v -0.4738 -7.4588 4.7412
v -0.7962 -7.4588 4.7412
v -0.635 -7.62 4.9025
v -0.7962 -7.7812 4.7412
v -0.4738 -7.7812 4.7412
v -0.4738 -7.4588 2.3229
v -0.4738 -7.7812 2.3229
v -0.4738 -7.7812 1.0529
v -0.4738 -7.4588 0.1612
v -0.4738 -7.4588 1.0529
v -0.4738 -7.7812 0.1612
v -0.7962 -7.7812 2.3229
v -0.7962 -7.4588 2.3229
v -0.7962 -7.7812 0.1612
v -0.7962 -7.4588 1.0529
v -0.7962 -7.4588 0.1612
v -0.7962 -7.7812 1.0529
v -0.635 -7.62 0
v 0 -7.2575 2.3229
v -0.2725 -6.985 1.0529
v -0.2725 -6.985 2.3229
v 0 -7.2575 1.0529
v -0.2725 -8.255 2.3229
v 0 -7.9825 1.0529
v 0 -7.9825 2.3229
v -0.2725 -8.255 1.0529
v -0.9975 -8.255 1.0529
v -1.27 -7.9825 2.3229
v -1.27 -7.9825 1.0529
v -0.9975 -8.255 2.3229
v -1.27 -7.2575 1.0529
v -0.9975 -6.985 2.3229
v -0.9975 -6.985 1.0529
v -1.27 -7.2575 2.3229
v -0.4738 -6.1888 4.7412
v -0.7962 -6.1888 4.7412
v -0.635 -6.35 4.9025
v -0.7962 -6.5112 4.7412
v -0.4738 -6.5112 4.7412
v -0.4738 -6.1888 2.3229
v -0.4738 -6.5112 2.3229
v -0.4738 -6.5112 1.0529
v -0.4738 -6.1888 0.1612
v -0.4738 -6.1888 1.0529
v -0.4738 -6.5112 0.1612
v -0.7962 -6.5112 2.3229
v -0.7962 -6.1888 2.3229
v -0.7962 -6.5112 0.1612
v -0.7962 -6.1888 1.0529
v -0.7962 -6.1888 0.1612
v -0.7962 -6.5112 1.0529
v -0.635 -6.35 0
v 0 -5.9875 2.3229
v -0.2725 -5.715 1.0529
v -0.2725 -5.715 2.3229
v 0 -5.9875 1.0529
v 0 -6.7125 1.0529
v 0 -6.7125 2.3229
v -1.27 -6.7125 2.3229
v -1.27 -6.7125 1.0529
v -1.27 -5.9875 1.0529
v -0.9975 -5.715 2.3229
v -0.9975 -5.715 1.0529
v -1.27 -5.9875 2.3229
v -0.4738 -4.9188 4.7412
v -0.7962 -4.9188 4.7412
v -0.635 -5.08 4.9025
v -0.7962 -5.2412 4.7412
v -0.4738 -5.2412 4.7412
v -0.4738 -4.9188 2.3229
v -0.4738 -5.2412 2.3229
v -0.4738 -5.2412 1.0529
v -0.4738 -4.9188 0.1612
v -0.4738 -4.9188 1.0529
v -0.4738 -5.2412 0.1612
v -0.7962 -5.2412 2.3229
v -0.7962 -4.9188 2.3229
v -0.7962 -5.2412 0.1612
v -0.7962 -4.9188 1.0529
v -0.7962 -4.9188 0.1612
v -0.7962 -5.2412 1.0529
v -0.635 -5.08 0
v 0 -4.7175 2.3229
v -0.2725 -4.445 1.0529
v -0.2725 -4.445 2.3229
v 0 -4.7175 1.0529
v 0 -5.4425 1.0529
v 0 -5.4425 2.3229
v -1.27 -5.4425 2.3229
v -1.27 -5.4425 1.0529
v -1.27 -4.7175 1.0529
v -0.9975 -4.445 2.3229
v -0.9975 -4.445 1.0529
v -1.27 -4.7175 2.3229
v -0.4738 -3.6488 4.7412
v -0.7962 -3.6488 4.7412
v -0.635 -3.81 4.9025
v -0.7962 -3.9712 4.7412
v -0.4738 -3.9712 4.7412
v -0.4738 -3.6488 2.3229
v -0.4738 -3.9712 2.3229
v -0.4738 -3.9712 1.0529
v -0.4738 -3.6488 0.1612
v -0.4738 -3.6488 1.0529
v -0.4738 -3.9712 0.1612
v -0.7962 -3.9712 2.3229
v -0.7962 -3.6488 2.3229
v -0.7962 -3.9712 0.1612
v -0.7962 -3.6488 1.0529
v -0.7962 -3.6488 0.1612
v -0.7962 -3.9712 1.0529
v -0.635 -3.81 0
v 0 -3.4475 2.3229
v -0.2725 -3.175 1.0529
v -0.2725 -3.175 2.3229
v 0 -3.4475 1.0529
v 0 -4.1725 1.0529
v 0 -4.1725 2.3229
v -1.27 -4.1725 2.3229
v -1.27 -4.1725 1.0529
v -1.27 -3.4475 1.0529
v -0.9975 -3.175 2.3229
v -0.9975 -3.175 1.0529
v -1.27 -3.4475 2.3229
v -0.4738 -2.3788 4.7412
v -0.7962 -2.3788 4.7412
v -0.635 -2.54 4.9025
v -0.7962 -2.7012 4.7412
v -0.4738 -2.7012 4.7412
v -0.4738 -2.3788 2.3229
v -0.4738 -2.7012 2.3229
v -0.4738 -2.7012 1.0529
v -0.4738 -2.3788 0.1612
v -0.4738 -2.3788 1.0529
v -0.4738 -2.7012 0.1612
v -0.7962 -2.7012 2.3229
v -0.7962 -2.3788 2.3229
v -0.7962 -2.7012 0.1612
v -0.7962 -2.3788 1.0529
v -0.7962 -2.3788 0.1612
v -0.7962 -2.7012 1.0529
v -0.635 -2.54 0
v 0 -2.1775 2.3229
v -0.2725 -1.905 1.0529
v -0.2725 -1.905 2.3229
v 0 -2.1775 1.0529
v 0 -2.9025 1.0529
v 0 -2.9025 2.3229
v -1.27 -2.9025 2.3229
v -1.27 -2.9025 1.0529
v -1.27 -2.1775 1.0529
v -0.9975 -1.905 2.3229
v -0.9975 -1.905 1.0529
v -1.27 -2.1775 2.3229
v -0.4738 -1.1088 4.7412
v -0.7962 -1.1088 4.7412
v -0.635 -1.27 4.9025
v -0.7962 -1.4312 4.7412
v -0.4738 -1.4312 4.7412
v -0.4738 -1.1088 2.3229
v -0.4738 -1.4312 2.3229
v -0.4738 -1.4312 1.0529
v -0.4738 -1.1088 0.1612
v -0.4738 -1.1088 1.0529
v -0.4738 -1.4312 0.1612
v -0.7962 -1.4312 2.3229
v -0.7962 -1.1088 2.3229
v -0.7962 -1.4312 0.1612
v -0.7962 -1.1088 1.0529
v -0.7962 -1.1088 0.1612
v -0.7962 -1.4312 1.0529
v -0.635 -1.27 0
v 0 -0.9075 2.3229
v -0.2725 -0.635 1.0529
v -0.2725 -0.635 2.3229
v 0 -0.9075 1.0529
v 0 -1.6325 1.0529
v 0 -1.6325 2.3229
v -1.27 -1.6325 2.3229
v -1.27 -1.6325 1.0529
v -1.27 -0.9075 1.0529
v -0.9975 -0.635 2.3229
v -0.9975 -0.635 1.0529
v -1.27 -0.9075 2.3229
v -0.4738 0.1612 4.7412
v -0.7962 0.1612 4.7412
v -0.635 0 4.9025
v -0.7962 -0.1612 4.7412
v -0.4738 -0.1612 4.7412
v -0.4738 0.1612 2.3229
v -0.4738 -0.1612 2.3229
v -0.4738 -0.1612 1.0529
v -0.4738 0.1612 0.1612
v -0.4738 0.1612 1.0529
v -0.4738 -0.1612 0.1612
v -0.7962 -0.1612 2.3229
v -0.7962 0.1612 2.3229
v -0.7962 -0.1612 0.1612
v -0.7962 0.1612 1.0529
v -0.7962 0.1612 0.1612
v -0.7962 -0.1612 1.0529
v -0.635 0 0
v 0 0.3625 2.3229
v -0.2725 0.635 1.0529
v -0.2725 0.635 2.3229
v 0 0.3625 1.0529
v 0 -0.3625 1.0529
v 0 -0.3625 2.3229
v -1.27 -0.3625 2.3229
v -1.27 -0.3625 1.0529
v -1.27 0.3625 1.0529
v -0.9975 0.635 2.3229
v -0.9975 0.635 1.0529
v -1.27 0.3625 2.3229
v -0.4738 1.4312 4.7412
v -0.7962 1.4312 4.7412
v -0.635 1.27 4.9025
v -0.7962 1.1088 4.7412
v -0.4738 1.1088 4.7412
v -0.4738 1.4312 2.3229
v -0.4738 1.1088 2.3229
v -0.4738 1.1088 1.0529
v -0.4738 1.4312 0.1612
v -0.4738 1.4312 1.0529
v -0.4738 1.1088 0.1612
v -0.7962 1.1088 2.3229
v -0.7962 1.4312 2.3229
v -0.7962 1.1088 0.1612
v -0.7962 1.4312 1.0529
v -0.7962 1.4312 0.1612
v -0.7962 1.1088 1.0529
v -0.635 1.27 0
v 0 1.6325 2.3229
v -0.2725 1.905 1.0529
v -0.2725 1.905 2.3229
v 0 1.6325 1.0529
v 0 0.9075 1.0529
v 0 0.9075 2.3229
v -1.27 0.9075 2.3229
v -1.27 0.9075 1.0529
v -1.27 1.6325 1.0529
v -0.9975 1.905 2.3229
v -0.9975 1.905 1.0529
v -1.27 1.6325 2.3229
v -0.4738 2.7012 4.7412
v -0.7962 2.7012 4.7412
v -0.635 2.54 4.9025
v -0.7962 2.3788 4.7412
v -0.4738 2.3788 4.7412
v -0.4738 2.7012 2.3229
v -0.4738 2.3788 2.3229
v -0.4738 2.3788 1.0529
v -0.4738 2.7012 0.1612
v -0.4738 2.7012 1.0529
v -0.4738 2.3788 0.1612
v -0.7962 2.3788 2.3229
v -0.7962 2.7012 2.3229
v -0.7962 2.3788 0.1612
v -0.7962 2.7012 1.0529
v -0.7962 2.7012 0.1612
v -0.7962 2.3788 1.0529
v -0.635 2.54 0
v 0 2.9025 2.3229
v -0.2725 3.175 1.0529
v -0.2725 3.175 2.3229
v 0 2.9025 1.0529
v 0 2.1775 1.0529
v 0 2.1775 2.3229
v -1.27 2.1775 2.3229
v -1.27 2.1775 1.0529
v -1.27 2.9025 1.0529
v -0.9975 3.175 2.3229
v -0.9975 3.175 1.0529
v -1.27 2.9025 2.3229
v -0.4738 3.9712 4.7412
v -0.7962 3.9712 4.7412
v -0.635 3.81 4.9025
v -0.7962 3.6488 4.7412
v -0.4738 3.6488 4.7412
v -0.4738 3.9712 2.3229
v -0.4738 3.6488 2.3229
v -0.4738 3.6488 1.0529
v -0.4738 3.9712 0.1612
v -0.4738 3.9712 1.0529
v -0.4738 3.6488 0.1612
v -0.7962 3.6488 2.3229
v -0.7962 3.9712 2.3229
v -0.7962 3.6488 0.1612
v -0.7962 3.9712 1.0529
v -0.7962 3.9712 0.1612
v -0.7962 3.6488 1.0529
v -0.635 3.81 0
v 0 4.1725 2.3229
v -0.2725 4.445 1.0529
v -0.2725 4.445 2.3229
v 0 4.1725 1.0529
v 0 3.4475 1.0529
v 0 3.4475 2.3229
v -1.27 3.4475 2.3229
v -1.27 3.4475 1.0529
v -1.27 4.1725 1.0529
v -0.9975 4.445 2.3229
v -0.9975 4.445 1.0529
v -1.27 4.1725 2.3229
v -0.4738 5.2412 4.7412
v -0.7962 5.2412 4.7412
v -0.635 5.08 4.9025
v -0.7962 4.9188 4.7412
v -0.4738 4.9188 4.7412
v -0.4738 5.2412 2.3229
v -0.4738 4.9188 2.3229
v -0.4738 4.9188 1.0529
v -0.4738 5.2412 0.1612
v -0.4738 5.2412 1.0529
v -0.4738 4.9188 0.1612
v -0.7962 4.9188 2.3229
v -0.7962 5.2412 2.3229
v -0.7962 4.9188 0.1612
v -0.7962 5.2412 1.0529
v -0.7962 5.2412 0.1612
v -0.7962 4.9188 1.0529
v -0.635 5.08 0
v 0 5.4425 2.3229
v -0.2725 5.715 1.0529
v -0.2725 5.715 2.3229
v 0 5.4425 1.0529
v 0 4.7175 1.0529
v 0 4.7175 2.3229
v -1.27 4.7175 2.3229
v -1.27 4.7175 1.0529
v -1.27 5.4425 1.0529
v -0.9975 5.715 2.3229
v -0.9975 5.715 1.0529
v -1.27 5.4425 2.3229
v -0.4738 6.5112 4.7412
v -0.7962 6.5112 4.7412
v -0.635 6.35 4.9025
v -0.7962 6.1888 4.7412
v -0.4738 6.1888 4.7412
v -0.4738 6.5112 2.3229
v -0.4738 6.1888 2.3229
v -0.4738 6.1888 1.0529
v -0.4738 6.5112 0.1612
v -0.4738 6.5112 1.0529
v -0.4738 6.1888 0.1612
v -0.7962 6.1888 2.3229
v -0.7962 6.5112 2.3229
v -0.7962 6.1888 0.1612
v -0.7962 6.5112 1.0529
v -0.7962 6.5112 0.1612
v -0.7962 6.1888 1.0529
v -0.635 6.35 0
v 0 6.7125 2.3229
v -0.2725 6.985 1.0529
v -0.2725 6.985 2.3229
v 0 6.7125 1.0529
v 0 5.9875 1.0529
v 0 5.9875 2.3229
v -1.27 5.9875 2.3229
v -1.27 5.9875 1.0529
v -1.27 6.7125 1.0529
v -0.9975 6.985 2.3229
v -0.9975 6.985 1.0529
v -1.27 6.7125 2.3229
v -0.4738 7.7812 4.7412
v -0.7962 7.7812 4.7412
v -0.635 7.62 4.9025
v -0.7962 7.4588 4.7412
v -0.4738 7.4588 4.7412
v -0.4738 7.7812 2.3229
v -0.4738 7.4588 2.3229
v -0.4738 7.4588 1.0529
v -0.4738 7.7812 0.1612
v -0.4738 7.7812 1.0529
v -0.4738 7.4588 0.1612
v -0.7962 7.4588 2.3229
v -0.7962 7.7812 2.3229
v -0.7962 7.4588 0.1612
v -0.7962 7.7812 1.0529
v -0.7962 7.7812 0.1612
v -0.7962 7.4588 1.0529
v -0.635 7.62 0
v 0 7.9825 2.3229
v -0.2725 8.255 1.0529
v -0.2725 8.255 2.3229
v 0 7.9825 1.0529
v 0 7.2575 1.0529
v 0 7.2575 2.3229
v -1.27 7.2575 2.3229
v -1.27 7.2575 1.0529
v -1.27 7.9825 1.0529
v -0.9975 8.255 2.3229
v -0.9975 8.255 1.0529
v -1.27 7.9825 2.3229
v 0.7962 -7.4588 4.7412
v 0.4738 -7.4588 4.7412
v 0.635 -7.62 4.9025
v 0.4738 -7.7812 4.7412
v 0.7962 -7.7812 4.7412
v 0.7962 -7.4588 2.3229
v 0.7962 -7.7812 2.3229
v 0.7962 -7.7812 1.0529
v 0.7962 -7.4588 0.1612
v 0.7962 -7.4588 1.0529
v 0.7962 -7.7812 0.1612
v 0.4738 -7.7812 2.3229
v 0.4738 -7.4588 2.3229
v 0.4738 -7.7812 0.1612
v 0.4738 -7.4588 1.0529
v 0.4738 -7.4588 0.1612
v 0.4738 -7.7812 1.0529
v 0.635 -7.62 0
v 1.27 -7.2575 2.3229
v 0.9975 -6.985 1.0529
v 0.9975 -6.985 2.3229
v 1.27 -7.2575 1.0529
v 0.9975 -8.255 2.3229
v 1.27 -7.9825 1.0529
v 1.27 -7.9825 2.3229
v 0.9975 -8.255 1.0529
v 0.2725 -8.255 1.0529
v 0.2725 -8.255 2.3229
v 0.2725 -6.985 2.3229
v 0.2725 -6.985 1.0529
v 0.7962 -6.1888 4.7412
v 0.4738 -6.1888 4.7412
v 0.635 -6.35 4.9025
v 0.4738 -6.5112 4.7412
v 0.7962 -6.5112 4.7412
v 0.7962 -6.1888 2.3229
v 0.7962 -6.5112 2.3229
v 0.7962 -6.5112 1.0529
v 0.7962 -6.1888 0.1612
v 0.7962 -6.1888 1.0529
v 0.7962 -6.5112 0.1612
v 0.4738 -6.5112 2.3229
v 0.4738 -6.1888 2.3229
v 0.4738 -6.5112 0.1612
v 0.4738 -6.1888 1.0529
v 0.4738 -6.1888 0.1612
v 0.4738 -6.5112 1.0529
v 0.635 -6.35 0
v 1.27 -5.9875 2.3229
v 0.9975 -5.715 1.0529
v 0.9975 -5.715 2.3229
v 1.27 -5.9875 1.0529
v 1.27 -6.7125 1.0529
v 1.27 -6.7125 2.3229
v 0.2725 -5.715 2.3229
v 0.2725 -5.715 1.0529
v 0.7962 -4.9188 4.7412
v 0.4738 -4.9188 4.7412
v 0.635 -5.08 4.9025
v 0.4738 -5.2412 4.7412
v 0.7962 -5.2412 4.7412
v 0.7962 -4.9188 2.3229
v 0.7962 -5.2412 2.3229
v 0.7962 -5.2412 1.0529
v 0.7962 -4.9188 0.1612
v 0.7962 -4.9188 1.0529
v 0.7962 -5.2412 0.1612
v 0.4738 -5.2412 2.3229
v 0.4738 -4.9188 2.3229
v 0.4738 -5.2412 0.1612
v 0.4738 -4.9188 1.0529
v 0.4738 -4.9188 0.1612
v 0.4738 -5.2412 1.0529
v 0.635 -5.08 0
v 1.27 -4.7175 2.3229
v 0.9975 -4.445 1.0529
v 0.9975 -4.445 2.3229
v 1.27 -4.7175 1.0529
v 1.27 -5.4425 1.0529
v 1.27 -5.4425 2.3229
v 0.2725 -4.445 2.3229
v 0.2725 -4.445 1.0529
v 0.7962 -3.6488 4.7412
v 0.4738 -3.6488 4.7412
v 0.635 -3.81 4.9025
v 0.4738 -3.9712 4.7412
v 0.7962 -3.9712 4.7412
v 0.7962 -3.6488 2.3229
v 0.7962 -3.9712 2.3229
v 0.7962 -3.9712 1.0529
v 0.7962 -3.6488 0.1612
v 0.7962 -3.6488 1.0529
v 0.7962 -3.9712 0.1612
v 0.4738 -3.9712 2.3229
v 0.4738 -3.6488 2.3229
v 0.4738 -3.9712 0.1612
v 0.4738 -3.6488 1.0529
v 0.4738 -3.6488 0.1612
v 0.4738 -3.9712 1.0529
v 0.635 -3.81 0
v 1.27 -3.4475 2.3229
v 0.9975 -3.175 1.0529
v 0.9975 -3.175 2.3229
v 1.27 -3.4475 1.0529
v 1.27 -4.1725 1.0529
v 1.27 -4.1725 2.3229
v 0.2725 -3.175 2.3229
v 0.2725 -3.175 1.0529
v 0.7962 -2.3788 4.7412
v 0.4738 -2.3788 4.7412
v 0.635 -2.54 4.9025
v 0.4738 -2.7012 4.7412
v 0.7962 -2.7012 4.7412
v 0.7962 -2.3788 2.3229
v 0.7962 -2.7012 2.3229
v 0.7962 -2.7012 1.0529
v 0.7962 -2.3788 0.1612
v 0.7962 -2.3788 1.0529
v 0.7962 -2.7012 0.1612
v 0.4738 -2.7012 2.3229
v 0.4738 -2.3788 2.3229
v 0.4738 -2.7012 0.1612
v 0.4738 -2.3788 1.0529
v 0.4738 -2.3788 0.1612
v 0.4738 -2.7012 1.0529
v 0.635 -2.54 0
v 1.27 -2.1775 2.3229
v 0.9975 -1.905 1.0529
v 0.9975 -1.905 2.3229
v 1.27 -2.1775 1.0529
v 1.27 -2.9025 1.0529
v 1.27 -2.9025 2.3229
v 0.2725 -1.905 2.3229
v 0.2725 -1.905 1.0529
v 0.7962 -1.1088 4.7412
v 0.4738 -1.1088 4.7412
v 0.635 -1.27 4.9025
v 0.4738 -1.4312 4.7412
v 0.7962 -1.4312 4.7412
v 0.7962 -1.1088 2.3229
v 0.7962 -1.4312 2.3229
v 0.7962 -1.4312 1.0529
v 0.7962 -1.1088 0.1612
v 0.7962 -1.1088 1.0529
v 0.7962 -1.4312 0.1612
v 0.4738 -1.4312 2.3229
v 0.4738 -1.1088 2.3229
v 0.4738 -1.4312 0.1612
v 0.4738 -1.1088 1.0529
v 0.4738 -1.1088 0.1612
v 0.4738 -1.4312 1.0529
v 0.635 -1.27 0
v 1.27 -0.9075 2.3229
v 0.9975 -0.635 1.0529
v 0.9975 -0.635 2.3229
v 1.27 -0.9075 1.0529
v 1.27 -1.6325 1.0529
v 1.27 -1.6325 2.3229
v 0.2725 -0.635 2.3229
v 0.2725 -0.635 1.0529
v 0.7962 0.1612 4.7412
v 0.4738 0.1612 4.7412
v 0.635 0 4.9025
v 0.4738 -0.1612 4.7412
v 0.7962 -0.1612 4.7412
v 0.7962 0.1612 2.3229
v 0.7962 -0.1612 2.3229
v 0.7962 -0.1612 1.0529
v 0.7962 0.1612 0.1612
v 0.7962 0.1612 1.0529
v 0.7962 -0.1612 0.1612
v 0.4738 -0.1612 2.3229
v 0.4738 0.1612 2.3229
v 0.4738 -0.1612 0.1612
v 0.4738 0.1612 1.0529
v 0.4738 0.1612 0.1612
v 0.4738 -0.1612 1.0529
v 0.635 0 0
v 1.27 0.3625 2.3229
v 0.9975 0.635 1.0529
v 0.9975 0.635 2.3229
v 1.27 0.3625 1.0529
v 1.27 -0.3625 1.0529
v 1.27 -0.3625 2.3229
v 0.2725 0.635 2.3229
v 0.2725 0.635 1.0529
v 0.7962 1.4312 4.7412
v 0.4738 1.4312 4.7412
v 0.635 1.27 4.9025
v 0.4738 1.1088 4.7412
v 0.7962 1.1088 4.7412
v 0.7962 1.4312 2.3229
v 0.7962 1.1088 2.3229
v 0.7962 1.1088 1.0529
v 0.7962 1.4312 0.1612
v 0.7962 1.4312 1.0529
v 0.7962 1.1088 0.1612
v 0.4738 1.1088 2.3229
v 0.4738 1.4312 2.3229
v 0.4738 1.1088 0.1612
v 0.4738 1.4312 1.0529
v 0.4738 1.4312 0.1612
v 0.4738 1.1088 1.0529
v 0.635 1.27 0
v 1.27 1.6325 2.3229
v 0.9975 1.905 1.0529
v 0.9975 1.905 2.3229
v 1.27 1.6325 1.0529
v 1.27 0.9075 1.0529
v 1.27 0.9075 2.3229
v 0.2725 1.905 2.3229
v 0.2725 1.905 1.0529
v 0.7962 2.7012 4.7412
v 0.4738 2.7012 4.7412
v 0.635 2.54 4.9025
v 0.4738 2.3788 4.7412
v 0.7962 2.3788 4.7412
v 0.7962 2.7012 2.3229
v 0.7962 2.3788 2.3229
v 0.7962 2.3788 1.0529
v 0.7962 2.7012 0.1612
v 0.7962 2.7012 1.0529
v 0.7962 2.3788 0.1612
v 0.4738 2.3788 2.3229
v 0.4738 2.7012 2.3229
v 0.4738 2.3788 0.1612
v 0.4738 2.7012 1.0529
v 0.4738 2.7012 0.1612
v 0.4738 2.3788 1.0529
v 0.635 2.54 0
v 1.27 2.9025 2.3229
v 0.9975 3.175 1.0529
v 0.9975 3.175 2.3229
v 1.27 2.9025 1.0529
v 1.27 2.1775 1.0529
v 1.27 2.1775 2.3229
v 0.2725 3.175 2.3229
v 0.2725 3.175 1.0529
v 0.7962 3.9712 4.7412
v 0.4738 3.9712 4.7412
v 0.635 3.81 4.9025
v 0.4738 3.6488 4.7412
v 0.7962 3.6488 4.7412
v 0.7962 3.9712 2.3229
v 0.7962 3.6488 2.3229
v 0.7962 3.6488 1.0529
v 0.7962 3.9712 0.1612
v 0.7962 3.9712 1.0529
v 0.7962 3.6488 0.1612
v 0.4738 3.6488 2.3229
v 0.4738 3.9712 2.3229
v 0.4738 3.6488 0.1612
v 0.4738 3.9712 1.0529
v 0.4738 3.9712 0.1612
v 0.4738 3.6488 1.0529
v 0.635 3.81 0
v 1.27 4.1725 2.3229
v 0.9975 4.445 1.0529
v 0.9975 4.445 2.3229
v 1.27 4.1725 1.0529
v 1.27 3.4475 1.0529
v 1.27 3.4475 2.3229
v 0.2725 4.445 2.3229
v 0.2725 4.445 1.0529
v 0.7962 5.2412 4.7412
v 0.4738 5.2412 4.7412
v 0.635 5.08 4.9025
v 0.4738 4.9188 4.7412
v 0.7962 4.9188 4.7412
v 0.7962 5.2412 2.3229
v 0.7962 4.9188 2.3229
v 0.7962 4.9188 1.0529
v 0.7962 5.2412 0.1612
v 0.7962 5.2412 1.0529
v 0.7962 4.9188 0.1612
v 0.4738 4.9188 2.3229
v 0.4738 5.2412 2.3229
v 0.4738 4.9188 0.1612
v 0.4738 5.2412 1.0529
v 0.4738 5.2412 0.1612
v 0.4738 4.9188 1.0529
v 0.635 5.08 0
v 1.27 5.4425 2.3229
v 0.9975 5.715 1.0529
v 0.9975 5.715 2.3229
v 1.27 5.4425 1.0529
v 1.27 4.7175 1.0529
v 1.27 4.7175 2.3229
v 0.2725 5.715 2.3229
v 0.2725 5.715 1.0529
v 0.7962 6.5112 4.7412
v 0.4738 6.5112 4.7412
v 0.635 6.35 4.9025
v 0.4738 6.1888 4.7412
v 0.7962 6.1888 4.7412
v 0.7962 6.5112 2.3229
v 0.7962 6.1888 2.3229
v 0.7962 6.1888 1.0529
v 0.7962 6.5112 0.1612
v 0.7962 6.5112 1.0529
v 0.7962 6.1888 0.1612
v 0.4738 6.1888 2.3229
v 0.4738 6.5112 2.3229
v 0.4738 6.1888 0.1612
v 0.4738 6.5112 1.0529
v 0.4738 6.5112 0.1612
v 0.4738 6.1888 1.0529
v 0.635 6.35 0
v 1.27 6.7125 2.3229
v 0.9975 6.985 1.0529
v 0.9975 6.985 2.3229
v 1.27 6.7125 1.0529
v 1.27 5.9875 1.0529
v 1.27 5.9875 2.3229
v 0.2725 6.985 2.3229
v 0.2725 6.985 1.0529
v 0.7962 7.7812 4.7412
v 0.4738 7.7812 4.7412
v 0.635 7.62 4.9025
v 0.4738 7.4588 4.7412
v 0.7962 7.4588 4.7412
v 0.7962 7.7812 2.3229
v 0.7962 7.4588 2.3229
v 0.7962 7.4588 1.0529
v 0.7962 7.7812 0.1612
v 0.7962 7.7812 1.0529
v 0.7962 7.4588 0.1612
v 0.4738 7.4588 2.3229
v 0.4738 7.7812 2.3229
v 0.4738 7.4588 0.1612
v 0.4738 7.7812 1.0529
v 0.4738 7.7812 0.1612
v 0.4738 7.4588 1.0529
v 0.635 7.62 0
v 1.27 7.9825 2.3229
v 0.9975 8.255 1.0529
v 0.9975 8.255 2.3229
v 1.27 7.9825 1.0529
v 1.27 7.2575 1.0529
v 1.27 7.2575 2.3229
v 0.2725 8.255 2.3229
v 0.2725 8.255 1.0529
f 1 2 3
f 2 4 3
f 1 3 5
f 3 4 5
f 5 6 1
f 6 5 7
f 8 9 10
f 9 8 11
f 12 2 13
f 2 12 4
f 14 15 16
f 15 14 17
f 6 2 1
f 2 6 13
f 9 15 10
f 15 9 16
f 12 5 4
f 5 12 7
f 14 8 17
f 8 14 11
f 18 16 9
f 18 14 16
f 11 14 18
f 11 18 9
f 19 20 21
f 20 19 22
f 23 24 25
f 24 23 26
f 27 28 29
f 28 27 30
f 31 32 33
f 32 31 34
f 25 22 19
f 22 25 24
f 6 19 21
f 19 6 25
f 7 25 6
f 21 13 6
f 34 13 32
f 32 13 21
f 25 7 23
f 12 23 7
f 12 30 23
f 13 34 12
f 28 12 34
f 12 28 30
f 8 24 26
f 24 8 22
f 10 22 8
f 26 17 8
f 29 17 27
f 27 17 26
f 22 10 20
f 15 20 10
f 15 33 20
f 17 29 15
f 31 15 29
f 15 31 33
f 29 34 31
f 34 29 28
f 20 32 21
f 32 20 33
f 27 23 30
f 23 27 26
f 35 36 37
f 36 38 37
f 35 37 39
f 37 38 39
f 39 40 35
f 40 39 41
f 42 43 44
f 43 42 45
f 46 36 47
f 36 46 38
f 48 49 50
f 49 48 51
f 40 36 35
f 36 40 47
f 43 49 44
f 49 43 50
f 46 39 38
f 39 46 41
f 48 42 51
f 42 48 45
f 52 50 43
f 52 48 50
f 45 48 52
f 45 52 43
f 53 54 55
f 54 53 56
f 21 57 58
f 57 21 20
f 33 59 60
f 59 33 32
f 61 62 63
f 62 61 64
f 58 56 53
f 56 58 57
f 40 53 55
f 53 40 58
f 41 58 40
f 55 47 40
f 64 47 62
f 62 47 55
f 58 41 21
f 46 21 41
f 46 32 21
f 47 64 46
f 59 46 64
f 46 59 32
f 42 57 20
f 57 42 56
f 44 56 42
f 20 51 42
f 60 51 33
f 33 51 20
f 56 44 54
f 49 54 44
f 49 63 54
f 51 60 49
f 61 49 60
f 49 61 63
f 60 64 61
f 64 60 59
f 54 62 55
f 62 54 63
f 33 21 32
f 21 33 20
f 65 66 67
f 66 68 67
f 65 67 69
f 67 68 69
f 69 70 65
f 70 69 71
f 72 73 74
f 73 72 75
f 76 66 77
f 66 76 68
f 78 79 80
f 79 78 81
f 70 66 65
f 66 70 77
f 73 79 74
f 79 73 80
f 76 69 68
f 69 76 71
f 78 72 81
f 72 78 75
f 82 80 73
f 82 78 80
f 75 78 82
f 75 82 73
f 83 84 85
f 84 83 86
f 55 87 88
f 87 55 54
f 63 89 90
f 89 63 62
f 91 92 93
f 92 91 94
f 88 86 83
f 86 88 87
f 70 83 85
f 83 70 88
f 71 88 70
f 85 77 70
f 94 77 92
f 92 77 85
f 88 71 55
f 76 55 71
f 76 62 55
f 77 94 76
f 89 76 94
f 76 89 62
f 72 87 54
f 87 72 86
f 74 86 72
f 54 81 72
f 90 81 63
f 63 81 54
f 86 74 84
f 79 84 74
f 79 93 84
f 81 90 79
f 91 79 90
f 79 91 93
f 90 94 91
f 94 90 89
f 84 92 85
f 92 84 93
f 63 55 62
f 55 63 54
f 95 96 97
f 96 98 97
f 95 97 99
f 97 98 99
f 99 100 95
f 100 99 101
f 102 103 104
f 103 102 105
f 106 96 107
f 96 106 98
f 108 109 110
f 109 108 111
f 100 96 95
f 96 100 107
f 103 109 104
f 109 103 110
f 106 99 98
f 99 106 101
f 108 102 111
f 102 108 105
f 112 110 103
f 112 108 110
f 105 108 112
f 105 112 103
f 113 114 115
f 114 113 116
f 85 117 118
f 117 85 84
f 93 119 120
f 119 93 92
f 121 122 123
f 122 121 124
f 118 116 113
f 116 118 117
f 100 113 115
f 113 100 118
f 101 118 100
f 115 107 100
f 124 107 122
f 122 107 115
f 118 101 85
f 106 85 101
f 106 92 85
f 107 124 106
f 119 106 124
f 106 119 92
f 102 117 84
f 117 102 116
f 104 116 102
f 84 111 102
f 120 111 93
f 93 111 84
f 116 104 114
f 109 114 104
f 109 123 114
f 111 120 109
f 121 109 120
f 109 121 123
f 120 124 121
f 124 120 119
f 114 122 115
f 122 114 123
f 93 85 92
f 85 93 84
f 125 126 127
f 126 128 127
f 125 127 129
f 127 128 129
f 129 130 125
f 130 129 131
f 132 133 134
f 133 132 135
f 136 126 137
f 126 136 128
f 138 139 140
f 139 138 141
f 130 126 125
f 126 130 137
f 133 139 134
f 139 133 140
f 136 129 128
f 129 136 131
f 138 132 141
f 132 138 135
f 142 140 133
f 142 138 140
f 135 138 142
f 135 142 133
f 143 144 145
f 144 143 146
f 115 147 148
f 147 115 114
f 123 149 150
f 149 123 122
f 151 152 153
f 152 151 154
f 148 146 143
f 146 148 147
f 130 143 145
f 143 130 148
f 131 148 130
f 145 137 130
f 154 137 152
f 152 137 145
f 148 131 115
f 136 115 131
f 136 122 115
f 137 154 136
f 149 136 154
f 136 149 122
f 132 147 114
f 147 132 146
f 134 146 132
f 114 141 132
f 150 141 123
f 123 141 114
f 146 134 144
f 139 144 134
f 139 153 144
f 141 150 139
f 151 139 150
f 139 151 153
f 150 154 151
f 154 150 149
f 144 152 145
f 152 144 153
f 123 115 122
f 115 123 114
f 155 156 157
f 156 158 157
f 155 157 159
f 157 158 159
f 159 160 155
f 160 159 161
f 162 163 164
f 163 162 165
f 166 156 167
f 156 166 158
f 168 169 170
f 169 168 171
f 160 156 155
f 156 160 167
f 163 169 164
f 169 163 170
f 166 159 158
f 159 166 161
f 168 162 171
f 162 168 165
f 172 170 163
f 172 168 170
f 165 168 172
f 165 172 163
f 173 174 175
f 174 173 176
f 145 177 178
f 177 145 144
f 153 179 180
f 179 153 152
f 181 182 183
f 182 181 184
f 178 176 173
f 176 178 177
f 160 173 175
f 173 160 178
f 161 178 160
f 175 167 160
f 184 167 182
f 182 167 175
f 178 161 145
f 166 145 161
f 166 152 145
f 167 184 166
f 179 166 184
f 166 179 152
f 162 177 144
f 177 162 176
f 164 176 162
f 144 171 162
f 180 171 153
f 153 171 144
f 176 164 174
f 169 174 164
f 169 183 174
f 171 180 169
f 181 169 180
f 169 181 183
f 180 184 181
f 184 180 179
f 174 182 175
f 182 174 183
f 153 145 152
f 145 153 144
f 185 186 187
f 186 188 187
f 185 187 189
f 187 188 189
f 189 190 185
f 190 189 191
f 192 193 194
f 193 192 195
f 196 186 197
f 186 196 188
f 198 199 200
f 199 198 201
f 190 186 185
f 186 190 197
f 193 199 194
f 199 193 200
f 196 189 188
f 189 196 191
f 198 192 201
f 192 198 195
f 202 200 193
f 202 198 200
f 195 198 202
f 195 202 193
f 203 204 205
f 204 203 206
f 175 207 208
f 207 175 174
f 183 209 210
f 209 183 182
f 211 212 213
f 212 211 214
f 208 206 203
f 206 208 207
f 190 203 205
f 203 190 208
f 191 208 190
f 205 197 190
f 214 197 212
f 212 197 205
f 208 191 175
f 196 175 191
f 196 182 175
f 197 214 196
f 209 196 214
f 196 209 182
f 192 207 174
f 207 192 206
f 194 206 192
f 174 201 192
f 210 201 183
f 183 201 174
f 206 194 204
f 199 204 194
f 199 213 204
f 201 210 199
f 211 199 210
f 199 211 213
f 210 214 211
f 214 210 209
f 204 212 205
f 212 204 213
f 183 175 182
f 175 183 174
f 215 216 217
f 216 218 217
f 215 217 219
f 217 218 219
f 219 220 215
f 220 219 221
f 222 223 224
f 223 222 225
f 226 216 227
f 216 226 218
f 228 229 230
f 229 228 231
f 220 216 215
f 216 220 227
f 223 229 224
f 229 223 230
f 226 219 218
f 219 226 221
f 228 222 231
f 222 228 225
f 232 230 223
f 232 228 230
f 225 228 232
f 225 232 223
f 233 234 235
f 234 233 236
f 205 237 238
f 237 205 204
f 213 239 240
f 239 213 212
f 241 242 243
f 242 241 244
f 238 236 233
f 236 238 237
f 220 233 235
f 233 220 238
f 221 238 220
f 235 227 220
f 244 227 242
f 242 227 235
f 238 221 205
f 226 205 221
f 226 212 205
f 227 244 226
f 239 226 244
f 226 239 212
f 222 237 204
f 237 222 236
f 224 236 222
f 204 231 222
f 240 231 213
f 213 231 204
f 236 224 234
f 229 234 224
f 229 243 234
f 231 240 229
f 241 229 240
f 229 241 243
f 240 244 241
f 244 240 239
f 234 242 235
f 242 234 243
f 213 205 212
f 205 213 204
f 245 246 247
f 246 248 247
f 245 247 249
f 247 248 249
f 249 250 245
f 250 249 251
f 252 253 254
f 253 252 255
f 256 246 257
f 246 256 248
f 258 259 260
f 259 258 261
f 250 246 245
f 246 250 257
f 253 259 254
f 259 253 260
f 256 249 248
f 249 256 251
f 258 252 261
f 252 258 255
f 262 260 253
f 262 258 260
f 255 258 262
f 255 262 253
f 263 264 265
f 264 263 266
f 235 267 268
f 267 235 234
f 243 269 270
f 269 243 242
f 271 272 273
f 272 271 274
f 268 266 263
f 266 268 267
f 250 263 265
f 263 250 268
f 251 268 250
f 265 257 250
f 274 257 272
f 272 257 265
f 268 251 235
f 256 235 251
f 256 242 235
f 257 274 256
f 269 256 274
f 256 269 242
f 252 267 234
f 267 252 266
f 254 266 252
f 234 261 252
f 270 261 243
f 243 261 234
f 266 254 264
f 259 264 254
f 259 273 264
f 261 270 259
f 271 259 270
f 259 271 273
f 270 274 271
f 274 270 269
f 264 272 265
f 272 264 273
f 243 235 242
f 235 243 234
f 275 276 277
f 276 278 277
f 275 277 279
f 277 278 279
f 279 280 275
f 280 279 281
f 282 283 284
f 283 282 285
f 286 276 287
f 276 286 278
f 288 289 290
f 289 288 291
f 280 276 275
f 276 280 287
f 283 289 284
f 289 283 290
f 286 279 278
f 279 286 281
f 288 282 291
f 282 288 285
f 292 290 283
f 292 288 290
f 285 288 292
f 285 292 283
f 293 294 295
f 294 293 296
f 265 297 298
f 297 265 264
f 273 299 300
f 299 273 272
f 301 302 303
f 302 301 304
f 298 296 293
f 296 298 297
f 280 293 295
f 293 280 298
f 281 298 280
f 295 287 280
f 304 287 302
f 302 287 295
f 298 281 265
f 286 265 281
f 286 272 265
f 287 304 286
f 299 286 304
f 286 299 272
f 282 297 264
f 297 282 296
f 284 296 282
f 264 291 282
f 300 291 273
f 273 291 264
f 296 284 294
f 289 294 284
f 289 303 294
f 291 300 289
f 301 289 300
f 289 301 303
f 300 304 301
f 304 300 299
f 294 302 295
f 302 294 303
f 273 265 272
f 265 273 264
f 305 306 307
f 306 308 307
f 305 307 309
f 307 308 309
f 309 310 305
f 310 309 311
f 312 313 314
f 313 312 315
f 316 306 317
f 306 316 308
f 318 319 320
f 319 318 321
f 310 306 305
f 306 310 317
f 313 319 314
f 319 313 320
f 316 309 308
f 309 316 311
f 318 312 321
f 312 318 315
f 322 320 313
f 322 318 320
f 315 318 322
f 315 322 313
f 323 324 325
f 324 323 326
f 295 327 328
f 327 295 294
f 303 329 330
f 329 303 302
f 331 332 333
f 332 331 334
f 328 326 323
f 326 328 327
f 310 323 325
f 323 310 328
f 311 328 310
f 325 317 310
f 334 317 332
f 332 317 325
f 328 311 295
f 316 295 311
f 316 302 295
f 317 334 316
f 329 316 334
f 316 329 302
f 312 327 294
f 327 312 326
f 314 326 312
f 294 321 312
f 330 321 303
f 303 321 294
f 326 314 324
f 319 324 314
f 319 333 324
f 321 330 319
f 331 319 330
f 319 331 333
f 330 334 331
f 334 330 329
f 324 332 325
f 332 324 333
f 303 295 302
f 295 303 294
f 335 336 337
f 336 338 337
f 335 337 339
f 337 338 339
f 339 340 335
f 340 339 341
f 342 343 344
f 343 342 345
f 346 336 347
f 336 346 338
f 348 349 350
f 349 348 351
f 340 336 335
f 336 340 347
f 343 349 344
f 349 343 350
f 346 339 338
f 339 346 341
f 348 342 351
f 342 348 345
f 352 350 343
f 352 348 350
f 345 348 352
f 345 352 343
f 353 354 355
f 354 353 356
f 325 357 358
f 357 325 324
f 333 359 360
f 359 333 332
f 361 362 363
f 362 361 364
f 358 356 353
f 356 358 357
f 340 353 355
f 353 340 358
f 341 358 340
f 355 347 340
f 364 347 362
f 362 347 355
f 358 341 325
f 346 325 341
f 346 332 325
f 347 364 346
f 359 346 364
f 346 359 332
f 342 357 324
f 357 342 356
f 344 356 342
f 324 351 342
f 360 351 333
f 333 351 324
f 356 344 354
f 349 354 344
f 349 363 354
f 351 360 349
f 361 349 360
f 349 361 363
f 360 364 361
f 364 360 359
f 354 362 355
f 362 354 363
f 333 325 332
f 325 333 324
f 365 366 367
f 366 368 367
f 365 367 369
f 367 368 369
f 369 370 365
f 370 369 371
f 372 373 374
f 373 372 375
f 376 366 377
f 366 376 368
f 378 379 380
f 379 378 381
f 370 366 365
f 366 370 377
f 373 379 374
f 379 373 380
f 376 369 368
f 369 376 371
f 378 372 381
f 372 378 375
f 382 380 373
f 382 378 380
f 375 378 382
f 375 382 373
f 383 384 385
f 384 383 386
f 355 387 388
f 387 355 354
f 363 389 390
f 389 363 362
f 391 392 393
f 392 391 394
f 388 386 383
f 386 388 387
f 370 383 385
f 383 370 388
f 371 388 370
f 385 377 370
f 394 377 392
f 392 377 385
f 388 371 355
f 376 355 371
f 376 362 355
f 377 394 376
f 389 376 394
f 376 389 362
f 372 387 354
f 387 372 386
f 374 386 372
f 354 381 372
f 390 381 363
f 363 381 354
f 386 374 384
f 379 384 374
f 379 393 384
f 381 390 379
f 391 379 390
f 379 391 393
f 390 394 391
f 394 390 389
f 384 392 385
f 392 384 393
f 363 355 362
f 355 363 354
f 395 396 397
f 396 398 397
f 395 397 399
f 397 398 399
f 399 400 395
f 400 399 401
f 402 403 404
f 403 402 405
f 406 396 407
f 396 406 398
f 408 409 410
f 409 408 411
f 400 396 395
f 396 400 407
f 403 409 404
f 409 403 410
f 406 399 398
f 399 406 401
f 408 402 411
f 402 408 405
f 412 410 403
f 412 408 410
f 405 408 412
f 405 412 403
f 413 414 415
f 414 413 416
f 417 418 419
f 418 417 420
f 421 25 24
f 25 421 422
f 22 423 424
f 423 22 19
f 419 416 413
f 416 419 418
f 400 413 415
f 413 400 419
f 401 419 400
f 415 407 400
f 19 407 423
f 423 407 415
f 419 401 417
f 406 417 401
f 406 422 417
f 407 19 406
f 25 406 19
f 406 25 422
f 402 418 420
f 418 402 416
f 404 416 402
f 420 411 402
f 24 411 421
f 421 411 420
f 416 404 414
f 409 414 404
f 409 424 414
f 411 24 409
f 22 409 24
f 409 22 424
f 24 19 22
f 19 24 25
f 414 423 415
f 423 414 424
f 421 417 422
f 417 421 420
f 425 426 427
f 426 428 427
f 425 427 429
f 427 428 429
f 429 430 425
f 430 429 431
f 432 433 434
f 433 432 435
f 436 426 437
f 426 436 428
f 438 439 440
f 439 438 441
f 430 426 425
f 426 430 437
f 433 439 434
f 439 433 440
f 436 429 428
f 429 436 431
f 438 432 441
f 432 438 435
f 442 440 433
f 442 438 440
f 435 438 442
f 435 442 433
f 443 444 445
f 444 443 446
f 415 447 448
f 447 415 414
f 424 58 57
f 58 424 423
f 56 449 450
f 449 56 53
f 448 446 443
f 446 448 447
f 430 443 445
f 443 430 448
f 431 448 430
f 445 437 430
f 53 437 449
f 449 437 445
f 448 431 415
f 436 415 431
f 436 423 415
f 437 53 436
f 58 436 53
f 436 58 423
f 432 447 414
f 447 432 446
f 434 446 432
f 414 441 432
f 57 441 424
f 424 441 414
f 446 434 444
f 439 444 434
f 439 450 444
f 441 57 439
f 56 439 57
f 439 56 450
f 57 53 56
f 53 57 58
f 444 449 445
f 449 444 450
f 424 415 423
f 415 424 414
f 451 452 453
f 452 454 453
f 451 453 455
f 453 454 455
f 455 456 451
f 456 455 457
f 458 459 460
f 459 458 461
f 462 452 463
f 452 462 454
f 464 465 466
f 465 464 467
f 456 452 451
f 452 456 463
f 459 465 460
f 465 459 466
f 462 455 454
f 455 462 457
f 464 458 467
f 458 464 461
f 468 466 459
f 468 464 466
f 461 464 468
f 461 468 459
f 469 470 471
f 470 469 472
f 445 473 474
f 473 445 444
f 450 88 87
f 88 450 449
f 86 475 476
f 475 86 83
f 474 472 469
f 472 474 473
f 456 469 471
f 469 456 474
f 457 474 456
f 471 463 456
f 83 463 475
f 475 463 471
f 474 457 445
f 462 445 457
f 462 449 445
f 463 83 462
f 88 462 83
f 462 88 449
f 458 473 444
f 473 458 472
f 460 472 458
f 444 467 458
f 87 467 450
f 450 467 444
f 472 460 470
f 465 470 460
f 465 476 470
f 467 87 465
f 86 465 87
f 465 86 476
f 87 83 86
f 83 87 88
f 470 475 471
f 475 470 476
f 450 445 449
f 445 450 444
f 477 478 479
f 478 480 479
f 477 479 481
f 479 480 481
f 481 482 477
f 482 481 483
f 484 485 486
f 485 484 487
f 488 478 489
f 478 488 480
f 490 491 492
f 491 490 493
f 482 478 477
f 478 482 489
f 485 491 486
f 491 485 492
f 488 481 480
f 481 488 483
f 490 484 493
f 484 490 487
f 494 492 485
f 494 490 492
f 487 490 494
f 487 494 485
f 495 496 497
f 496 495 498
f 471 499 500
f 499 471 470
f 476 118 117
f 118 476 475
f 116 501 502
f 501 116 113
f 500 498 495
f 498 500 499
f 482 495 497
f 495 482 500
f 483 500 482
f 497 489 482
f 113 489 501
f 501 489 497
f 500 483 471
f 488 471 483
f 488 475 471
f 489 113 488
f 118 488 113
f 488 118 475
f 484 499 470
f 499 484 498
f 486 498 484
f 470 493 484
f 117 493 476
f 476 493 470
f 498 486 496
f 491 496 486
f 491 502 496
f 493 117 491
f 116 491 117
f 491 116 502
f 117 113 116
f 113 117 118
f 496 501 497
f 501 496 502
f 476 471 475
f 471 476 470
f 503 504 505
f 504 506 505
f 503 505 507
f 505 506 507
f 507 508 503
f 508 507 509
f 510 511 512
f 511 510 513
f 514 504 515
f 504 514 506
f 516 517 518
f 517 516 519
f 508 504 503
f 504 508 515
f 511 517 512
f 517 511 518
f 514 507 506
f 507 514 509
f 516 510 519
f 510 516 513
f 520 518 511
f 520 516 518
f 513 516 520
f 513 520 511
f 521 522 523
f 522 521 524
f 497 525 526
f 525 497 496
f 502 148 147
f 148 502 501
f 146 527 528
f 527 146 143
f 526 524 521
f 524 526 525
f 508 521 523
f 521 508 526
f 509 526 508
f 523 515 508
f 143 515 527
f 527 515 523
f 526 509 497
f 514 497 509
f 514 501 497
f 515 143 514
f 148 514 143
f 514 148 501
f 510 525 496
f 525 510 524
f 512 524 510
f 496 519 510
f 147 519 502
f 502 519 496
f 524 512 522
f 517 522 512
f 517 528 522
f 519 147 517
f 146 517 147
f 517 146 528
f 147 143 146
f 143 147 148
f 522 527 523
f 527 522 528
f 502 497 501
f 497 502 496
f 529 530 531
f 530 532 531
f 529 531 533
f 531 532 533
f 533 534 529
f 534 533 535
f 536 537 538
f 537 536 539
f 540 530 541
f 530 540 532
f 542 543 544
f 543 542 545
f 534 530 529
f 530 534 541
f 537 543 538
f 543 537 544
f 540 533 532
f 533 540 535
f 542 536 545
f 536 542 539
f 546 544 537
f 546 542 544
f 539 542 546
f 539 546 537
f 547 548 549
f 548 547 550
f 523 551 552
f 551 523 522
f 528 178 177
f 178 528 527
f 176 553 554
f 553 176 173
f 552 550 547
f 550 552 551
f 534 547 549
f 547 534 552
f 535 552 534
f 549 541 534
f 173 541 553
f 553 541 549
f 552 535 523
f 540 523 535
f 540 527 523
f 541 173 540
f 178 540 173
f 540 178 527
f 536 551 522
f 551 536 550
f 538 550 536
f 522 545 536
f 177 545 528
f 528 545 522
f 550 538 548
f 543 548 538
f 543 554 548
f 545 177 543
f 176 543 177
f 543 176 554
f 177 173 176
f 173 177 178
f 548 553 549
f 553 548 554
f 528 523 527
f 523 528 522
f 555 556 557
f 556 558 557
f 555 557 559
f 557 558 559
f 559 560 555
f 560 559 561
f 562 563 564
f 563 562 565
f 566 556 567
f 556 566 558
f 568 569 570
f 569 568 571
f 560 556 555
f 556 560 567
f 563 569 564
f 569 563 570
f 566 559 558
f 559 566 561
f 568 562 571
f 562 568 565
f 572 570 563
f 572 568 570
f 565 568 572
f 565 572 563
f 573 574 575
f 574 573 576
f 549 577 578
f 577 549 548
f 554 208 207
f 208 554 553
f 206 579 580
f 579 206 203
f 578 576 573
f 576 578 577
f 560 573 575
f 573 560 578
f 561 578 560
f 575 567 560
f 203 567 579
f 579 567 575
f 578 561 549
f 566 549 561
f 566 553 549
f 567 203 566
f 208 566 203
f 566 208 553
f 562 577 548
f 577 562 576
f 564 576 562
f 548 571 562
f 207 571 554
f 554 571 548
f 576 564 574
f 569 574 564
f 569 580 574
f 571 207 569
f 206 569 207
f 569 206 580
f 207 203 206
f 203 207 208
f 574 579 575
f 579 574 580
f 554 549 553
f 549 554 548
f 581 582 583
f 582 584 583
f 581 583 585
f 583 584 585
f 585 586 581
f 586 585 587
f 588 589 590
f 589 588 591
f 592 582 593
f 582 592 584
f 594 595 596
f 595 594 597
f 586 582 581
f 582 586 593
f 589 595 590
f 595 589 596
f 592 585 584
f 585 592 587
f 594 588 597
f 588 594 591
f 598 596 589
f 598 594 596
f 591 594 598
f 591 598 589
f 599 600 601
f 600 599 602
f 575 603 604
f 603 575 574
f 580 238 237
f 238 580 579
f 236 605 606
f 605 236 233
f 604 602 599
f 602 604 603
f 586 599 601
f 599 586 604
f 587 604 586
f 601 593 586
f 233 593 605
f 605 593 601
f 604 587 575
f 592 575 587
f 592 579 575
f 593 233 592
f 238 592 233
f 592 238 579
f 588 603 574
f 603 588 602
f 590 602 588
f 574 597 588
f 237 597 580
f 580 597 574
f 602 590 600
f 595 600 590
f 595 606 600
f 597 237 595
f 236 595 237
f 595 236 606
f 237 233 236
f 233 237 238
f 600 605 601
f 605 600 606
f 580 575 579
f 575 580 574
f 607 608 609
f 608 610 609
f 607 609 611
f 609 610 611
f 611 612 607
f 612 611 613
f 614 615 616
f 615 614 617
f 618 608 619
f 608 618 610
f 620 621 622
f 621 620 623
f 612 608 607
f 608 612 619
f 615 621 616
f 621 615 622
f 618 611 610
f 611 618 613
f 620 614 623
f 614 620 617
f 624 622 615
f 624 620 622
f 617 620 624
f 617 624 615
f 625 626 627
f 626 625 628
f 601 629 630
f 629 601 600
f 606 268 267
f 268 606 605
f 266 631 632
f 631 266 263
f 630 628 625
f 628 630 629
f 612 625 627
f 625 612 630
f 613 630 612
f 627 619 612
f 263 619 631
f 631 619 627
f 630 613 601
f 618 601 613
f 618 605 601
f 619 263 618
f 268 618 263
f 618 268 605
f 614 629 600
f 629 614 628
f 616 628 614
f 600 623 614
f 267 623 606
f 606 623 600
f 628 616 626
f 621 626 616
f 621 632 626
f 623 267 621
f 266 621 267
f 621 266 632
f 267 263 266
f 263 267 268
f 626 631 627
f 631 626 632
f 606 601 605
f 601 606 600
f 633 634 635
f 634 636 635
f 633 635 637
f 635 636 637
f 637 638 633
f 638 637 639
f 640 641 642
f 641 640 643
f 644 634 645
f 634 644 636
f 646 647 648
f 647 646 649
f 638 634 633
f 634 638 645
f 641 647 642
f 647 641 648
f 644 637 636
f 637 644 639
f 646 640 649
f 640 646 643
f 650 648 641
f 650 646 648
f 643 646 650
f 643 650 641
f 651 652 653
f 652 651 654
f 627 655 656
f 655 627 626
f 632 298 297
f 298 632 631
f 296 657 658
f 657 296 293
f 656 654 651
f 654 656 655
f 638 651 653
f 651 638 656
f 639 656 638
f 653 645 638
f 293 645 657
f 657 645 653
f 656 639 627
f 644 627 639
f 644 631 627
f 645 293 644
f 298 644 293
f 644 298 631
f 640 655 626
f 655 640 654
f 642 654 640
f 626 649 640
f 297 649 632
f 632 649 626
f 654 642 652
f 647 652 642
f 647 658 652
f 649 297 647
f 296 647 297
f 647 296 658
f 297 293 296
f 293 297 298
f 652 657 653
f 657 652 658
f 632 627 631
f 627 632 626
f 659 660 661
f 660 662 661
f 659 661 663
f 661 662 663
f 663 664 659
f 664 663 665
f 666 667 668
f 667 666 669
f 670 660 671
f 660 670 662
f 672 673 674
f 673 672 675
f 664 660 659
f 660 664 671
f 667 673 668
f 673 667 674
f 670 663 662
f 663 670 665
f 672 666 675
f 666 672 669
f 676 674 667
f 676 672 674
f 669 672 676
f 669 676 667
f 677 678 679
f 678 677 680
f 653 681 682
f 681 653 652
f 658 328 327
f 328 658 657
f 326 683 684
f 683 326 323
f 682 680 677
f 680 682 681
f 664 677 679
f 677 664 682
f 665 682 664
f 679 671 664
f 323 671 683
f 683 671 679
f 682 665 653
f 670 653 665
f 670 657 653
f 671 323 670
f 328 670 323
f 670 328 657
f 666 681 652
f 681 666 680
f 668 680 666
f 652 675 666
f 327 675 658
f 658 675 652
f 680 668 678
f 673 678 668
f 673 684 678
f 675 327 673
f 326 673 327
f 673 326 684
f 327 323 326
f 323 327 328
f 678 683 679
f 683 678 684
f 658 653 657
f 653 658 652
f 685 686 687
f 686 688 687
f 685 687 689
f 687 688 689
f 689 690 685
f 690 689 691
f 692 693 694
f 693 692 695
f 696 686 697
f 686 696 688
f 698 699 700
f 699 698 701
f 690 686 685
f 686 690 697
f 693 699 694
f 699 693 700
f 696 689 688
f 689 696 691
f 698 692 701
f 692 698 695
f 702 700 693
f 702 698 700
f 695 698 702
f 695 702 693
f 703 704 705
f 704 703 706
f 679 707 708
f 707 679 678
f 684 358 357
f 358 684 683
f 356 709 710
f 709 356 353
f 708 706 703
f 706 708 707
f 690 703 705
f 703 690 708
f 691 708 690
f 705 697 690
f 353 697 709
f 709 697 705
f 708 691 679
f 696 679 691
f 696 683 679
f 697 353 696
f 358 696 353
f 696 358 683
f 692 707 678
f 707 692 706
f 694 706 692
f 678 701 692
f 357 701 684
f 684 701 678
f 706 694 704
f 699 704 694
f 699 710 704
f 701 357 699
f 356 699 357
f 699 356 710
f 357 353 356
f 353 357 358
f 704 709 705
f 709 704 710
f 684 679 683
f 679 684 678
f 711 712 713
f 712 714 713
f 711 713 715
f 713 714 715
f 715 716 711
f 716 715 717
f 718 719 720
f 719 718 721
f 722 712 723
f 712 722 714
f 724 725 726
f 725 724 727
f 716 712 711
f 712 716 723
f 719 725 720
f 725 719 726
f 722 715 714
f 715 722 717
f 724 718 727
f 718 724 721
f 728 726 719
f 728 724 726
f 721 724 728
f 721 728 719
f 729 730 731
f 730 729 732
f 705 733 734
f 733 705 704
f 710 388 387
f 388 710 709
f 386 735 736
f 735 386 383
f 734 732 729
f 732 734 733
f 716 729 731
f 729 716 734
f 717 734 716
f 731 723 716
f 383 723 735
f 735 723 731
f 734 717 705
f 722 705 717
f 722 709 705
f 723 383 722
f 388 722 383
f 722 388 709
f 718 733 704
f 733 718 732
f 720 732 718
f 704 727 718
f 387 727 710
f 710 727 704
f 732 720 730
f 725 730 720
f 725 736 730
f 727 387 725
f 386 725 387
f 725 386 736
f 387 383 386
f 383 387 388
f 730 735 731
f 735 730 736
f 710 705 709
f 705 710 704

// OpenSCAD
/*
 * From:
 * Pin Headers for OpenSCAD (http://www.thingiverse.com/thing:26474)
 */
// Number of rows of pins in the header
header_rows = 13; // [1, 2, 3, 4, 5, 6, 7, 8, 9, 10, ...]

//Number of columns of pins in the header
header_columns = 2; // [1, 2, 3]

//The header's pitch between any two pins
header_pitch = 1.27; // [1.27, 2.54]

header(header_rows, header_columns, header_pitch);

module header(rows, cols=2, pitch=1.27) {
    offsety = -1 * ((rows-1) / 2 * pitch);
    offsetx = -1 * ((cols-1)/ 2 * pitch);
    translate([offsetx, offsety, 0]) {
      union() {
          for (j = [0:1:cols-1]) {
              translate([pitch*j,0,0])
              for (i=[0:1:rows-1]) {
                  translate([0, pitch * i, 0]) {
                    pin(pitch);
                  }
              }
          }
      }
    }
}

module pin(p = 2.54) {
    s = p / 4 + 0.005;
    h = p * 4 - 0.5;
    base = h / 3;
    d = s / 2;
    union() {
        color("gold") {
          union(){
            translate([0,0,h+d])rotate([0,0,45]) {
              cylinder($fn = 4, r1=sqrt(2 * pow(d, 2)), r2=0, h=d, center=false);
            }
            translate([-d, -d, d]) {
              cube([s, s, h], center=false);
            }
            translate([0, 0, d]) {
              rotate([0, 0, 45]){
                mirror([0, 0, d]) {
                  cylinder($fn=4, r1=sqrt(2 * pow(d, 2)), r2=0, h=d, center=false);
                }
              }
            }
          }
        }
       color("Dimgray") { 
         difference() {
            translate([0, 0, base + d]) {
              cube([p, p, p], center=true);
            }
            union() {
                translate([1.9 * s, 1.9 * s, base + d]) {
                  rotate([0, 0, 45]) {
                    cylinder($fn=3, r=2 * d, h=p + 1, center=true);
                  }
                }
                translate([1.9 * s, -1.9 * s, base + d -0.15]) {
                  rotate([0, 0, -45]) {
                    cylinder($fn=3, r=2 * d, h=p + 1, center=true);
                  }
                }
                translate([-1.9 * s, -1.9 * s, base + d -0.3]) {
                  rotate([0, 0, 180 + 45]) {
                    cylinder($fn=3, r=2 * d, h=p + 1, center=true);
                  }
                }
                translate([-1.9 * s, 1.9 * s, base + d -0.3]) {
                  rotate([0, 0, 180 - 45]) {
                    cylinder($fn=3, r=2 * d, h=p + 1, center=true);
                  }
                }
             }
          }
       }
    }
}
